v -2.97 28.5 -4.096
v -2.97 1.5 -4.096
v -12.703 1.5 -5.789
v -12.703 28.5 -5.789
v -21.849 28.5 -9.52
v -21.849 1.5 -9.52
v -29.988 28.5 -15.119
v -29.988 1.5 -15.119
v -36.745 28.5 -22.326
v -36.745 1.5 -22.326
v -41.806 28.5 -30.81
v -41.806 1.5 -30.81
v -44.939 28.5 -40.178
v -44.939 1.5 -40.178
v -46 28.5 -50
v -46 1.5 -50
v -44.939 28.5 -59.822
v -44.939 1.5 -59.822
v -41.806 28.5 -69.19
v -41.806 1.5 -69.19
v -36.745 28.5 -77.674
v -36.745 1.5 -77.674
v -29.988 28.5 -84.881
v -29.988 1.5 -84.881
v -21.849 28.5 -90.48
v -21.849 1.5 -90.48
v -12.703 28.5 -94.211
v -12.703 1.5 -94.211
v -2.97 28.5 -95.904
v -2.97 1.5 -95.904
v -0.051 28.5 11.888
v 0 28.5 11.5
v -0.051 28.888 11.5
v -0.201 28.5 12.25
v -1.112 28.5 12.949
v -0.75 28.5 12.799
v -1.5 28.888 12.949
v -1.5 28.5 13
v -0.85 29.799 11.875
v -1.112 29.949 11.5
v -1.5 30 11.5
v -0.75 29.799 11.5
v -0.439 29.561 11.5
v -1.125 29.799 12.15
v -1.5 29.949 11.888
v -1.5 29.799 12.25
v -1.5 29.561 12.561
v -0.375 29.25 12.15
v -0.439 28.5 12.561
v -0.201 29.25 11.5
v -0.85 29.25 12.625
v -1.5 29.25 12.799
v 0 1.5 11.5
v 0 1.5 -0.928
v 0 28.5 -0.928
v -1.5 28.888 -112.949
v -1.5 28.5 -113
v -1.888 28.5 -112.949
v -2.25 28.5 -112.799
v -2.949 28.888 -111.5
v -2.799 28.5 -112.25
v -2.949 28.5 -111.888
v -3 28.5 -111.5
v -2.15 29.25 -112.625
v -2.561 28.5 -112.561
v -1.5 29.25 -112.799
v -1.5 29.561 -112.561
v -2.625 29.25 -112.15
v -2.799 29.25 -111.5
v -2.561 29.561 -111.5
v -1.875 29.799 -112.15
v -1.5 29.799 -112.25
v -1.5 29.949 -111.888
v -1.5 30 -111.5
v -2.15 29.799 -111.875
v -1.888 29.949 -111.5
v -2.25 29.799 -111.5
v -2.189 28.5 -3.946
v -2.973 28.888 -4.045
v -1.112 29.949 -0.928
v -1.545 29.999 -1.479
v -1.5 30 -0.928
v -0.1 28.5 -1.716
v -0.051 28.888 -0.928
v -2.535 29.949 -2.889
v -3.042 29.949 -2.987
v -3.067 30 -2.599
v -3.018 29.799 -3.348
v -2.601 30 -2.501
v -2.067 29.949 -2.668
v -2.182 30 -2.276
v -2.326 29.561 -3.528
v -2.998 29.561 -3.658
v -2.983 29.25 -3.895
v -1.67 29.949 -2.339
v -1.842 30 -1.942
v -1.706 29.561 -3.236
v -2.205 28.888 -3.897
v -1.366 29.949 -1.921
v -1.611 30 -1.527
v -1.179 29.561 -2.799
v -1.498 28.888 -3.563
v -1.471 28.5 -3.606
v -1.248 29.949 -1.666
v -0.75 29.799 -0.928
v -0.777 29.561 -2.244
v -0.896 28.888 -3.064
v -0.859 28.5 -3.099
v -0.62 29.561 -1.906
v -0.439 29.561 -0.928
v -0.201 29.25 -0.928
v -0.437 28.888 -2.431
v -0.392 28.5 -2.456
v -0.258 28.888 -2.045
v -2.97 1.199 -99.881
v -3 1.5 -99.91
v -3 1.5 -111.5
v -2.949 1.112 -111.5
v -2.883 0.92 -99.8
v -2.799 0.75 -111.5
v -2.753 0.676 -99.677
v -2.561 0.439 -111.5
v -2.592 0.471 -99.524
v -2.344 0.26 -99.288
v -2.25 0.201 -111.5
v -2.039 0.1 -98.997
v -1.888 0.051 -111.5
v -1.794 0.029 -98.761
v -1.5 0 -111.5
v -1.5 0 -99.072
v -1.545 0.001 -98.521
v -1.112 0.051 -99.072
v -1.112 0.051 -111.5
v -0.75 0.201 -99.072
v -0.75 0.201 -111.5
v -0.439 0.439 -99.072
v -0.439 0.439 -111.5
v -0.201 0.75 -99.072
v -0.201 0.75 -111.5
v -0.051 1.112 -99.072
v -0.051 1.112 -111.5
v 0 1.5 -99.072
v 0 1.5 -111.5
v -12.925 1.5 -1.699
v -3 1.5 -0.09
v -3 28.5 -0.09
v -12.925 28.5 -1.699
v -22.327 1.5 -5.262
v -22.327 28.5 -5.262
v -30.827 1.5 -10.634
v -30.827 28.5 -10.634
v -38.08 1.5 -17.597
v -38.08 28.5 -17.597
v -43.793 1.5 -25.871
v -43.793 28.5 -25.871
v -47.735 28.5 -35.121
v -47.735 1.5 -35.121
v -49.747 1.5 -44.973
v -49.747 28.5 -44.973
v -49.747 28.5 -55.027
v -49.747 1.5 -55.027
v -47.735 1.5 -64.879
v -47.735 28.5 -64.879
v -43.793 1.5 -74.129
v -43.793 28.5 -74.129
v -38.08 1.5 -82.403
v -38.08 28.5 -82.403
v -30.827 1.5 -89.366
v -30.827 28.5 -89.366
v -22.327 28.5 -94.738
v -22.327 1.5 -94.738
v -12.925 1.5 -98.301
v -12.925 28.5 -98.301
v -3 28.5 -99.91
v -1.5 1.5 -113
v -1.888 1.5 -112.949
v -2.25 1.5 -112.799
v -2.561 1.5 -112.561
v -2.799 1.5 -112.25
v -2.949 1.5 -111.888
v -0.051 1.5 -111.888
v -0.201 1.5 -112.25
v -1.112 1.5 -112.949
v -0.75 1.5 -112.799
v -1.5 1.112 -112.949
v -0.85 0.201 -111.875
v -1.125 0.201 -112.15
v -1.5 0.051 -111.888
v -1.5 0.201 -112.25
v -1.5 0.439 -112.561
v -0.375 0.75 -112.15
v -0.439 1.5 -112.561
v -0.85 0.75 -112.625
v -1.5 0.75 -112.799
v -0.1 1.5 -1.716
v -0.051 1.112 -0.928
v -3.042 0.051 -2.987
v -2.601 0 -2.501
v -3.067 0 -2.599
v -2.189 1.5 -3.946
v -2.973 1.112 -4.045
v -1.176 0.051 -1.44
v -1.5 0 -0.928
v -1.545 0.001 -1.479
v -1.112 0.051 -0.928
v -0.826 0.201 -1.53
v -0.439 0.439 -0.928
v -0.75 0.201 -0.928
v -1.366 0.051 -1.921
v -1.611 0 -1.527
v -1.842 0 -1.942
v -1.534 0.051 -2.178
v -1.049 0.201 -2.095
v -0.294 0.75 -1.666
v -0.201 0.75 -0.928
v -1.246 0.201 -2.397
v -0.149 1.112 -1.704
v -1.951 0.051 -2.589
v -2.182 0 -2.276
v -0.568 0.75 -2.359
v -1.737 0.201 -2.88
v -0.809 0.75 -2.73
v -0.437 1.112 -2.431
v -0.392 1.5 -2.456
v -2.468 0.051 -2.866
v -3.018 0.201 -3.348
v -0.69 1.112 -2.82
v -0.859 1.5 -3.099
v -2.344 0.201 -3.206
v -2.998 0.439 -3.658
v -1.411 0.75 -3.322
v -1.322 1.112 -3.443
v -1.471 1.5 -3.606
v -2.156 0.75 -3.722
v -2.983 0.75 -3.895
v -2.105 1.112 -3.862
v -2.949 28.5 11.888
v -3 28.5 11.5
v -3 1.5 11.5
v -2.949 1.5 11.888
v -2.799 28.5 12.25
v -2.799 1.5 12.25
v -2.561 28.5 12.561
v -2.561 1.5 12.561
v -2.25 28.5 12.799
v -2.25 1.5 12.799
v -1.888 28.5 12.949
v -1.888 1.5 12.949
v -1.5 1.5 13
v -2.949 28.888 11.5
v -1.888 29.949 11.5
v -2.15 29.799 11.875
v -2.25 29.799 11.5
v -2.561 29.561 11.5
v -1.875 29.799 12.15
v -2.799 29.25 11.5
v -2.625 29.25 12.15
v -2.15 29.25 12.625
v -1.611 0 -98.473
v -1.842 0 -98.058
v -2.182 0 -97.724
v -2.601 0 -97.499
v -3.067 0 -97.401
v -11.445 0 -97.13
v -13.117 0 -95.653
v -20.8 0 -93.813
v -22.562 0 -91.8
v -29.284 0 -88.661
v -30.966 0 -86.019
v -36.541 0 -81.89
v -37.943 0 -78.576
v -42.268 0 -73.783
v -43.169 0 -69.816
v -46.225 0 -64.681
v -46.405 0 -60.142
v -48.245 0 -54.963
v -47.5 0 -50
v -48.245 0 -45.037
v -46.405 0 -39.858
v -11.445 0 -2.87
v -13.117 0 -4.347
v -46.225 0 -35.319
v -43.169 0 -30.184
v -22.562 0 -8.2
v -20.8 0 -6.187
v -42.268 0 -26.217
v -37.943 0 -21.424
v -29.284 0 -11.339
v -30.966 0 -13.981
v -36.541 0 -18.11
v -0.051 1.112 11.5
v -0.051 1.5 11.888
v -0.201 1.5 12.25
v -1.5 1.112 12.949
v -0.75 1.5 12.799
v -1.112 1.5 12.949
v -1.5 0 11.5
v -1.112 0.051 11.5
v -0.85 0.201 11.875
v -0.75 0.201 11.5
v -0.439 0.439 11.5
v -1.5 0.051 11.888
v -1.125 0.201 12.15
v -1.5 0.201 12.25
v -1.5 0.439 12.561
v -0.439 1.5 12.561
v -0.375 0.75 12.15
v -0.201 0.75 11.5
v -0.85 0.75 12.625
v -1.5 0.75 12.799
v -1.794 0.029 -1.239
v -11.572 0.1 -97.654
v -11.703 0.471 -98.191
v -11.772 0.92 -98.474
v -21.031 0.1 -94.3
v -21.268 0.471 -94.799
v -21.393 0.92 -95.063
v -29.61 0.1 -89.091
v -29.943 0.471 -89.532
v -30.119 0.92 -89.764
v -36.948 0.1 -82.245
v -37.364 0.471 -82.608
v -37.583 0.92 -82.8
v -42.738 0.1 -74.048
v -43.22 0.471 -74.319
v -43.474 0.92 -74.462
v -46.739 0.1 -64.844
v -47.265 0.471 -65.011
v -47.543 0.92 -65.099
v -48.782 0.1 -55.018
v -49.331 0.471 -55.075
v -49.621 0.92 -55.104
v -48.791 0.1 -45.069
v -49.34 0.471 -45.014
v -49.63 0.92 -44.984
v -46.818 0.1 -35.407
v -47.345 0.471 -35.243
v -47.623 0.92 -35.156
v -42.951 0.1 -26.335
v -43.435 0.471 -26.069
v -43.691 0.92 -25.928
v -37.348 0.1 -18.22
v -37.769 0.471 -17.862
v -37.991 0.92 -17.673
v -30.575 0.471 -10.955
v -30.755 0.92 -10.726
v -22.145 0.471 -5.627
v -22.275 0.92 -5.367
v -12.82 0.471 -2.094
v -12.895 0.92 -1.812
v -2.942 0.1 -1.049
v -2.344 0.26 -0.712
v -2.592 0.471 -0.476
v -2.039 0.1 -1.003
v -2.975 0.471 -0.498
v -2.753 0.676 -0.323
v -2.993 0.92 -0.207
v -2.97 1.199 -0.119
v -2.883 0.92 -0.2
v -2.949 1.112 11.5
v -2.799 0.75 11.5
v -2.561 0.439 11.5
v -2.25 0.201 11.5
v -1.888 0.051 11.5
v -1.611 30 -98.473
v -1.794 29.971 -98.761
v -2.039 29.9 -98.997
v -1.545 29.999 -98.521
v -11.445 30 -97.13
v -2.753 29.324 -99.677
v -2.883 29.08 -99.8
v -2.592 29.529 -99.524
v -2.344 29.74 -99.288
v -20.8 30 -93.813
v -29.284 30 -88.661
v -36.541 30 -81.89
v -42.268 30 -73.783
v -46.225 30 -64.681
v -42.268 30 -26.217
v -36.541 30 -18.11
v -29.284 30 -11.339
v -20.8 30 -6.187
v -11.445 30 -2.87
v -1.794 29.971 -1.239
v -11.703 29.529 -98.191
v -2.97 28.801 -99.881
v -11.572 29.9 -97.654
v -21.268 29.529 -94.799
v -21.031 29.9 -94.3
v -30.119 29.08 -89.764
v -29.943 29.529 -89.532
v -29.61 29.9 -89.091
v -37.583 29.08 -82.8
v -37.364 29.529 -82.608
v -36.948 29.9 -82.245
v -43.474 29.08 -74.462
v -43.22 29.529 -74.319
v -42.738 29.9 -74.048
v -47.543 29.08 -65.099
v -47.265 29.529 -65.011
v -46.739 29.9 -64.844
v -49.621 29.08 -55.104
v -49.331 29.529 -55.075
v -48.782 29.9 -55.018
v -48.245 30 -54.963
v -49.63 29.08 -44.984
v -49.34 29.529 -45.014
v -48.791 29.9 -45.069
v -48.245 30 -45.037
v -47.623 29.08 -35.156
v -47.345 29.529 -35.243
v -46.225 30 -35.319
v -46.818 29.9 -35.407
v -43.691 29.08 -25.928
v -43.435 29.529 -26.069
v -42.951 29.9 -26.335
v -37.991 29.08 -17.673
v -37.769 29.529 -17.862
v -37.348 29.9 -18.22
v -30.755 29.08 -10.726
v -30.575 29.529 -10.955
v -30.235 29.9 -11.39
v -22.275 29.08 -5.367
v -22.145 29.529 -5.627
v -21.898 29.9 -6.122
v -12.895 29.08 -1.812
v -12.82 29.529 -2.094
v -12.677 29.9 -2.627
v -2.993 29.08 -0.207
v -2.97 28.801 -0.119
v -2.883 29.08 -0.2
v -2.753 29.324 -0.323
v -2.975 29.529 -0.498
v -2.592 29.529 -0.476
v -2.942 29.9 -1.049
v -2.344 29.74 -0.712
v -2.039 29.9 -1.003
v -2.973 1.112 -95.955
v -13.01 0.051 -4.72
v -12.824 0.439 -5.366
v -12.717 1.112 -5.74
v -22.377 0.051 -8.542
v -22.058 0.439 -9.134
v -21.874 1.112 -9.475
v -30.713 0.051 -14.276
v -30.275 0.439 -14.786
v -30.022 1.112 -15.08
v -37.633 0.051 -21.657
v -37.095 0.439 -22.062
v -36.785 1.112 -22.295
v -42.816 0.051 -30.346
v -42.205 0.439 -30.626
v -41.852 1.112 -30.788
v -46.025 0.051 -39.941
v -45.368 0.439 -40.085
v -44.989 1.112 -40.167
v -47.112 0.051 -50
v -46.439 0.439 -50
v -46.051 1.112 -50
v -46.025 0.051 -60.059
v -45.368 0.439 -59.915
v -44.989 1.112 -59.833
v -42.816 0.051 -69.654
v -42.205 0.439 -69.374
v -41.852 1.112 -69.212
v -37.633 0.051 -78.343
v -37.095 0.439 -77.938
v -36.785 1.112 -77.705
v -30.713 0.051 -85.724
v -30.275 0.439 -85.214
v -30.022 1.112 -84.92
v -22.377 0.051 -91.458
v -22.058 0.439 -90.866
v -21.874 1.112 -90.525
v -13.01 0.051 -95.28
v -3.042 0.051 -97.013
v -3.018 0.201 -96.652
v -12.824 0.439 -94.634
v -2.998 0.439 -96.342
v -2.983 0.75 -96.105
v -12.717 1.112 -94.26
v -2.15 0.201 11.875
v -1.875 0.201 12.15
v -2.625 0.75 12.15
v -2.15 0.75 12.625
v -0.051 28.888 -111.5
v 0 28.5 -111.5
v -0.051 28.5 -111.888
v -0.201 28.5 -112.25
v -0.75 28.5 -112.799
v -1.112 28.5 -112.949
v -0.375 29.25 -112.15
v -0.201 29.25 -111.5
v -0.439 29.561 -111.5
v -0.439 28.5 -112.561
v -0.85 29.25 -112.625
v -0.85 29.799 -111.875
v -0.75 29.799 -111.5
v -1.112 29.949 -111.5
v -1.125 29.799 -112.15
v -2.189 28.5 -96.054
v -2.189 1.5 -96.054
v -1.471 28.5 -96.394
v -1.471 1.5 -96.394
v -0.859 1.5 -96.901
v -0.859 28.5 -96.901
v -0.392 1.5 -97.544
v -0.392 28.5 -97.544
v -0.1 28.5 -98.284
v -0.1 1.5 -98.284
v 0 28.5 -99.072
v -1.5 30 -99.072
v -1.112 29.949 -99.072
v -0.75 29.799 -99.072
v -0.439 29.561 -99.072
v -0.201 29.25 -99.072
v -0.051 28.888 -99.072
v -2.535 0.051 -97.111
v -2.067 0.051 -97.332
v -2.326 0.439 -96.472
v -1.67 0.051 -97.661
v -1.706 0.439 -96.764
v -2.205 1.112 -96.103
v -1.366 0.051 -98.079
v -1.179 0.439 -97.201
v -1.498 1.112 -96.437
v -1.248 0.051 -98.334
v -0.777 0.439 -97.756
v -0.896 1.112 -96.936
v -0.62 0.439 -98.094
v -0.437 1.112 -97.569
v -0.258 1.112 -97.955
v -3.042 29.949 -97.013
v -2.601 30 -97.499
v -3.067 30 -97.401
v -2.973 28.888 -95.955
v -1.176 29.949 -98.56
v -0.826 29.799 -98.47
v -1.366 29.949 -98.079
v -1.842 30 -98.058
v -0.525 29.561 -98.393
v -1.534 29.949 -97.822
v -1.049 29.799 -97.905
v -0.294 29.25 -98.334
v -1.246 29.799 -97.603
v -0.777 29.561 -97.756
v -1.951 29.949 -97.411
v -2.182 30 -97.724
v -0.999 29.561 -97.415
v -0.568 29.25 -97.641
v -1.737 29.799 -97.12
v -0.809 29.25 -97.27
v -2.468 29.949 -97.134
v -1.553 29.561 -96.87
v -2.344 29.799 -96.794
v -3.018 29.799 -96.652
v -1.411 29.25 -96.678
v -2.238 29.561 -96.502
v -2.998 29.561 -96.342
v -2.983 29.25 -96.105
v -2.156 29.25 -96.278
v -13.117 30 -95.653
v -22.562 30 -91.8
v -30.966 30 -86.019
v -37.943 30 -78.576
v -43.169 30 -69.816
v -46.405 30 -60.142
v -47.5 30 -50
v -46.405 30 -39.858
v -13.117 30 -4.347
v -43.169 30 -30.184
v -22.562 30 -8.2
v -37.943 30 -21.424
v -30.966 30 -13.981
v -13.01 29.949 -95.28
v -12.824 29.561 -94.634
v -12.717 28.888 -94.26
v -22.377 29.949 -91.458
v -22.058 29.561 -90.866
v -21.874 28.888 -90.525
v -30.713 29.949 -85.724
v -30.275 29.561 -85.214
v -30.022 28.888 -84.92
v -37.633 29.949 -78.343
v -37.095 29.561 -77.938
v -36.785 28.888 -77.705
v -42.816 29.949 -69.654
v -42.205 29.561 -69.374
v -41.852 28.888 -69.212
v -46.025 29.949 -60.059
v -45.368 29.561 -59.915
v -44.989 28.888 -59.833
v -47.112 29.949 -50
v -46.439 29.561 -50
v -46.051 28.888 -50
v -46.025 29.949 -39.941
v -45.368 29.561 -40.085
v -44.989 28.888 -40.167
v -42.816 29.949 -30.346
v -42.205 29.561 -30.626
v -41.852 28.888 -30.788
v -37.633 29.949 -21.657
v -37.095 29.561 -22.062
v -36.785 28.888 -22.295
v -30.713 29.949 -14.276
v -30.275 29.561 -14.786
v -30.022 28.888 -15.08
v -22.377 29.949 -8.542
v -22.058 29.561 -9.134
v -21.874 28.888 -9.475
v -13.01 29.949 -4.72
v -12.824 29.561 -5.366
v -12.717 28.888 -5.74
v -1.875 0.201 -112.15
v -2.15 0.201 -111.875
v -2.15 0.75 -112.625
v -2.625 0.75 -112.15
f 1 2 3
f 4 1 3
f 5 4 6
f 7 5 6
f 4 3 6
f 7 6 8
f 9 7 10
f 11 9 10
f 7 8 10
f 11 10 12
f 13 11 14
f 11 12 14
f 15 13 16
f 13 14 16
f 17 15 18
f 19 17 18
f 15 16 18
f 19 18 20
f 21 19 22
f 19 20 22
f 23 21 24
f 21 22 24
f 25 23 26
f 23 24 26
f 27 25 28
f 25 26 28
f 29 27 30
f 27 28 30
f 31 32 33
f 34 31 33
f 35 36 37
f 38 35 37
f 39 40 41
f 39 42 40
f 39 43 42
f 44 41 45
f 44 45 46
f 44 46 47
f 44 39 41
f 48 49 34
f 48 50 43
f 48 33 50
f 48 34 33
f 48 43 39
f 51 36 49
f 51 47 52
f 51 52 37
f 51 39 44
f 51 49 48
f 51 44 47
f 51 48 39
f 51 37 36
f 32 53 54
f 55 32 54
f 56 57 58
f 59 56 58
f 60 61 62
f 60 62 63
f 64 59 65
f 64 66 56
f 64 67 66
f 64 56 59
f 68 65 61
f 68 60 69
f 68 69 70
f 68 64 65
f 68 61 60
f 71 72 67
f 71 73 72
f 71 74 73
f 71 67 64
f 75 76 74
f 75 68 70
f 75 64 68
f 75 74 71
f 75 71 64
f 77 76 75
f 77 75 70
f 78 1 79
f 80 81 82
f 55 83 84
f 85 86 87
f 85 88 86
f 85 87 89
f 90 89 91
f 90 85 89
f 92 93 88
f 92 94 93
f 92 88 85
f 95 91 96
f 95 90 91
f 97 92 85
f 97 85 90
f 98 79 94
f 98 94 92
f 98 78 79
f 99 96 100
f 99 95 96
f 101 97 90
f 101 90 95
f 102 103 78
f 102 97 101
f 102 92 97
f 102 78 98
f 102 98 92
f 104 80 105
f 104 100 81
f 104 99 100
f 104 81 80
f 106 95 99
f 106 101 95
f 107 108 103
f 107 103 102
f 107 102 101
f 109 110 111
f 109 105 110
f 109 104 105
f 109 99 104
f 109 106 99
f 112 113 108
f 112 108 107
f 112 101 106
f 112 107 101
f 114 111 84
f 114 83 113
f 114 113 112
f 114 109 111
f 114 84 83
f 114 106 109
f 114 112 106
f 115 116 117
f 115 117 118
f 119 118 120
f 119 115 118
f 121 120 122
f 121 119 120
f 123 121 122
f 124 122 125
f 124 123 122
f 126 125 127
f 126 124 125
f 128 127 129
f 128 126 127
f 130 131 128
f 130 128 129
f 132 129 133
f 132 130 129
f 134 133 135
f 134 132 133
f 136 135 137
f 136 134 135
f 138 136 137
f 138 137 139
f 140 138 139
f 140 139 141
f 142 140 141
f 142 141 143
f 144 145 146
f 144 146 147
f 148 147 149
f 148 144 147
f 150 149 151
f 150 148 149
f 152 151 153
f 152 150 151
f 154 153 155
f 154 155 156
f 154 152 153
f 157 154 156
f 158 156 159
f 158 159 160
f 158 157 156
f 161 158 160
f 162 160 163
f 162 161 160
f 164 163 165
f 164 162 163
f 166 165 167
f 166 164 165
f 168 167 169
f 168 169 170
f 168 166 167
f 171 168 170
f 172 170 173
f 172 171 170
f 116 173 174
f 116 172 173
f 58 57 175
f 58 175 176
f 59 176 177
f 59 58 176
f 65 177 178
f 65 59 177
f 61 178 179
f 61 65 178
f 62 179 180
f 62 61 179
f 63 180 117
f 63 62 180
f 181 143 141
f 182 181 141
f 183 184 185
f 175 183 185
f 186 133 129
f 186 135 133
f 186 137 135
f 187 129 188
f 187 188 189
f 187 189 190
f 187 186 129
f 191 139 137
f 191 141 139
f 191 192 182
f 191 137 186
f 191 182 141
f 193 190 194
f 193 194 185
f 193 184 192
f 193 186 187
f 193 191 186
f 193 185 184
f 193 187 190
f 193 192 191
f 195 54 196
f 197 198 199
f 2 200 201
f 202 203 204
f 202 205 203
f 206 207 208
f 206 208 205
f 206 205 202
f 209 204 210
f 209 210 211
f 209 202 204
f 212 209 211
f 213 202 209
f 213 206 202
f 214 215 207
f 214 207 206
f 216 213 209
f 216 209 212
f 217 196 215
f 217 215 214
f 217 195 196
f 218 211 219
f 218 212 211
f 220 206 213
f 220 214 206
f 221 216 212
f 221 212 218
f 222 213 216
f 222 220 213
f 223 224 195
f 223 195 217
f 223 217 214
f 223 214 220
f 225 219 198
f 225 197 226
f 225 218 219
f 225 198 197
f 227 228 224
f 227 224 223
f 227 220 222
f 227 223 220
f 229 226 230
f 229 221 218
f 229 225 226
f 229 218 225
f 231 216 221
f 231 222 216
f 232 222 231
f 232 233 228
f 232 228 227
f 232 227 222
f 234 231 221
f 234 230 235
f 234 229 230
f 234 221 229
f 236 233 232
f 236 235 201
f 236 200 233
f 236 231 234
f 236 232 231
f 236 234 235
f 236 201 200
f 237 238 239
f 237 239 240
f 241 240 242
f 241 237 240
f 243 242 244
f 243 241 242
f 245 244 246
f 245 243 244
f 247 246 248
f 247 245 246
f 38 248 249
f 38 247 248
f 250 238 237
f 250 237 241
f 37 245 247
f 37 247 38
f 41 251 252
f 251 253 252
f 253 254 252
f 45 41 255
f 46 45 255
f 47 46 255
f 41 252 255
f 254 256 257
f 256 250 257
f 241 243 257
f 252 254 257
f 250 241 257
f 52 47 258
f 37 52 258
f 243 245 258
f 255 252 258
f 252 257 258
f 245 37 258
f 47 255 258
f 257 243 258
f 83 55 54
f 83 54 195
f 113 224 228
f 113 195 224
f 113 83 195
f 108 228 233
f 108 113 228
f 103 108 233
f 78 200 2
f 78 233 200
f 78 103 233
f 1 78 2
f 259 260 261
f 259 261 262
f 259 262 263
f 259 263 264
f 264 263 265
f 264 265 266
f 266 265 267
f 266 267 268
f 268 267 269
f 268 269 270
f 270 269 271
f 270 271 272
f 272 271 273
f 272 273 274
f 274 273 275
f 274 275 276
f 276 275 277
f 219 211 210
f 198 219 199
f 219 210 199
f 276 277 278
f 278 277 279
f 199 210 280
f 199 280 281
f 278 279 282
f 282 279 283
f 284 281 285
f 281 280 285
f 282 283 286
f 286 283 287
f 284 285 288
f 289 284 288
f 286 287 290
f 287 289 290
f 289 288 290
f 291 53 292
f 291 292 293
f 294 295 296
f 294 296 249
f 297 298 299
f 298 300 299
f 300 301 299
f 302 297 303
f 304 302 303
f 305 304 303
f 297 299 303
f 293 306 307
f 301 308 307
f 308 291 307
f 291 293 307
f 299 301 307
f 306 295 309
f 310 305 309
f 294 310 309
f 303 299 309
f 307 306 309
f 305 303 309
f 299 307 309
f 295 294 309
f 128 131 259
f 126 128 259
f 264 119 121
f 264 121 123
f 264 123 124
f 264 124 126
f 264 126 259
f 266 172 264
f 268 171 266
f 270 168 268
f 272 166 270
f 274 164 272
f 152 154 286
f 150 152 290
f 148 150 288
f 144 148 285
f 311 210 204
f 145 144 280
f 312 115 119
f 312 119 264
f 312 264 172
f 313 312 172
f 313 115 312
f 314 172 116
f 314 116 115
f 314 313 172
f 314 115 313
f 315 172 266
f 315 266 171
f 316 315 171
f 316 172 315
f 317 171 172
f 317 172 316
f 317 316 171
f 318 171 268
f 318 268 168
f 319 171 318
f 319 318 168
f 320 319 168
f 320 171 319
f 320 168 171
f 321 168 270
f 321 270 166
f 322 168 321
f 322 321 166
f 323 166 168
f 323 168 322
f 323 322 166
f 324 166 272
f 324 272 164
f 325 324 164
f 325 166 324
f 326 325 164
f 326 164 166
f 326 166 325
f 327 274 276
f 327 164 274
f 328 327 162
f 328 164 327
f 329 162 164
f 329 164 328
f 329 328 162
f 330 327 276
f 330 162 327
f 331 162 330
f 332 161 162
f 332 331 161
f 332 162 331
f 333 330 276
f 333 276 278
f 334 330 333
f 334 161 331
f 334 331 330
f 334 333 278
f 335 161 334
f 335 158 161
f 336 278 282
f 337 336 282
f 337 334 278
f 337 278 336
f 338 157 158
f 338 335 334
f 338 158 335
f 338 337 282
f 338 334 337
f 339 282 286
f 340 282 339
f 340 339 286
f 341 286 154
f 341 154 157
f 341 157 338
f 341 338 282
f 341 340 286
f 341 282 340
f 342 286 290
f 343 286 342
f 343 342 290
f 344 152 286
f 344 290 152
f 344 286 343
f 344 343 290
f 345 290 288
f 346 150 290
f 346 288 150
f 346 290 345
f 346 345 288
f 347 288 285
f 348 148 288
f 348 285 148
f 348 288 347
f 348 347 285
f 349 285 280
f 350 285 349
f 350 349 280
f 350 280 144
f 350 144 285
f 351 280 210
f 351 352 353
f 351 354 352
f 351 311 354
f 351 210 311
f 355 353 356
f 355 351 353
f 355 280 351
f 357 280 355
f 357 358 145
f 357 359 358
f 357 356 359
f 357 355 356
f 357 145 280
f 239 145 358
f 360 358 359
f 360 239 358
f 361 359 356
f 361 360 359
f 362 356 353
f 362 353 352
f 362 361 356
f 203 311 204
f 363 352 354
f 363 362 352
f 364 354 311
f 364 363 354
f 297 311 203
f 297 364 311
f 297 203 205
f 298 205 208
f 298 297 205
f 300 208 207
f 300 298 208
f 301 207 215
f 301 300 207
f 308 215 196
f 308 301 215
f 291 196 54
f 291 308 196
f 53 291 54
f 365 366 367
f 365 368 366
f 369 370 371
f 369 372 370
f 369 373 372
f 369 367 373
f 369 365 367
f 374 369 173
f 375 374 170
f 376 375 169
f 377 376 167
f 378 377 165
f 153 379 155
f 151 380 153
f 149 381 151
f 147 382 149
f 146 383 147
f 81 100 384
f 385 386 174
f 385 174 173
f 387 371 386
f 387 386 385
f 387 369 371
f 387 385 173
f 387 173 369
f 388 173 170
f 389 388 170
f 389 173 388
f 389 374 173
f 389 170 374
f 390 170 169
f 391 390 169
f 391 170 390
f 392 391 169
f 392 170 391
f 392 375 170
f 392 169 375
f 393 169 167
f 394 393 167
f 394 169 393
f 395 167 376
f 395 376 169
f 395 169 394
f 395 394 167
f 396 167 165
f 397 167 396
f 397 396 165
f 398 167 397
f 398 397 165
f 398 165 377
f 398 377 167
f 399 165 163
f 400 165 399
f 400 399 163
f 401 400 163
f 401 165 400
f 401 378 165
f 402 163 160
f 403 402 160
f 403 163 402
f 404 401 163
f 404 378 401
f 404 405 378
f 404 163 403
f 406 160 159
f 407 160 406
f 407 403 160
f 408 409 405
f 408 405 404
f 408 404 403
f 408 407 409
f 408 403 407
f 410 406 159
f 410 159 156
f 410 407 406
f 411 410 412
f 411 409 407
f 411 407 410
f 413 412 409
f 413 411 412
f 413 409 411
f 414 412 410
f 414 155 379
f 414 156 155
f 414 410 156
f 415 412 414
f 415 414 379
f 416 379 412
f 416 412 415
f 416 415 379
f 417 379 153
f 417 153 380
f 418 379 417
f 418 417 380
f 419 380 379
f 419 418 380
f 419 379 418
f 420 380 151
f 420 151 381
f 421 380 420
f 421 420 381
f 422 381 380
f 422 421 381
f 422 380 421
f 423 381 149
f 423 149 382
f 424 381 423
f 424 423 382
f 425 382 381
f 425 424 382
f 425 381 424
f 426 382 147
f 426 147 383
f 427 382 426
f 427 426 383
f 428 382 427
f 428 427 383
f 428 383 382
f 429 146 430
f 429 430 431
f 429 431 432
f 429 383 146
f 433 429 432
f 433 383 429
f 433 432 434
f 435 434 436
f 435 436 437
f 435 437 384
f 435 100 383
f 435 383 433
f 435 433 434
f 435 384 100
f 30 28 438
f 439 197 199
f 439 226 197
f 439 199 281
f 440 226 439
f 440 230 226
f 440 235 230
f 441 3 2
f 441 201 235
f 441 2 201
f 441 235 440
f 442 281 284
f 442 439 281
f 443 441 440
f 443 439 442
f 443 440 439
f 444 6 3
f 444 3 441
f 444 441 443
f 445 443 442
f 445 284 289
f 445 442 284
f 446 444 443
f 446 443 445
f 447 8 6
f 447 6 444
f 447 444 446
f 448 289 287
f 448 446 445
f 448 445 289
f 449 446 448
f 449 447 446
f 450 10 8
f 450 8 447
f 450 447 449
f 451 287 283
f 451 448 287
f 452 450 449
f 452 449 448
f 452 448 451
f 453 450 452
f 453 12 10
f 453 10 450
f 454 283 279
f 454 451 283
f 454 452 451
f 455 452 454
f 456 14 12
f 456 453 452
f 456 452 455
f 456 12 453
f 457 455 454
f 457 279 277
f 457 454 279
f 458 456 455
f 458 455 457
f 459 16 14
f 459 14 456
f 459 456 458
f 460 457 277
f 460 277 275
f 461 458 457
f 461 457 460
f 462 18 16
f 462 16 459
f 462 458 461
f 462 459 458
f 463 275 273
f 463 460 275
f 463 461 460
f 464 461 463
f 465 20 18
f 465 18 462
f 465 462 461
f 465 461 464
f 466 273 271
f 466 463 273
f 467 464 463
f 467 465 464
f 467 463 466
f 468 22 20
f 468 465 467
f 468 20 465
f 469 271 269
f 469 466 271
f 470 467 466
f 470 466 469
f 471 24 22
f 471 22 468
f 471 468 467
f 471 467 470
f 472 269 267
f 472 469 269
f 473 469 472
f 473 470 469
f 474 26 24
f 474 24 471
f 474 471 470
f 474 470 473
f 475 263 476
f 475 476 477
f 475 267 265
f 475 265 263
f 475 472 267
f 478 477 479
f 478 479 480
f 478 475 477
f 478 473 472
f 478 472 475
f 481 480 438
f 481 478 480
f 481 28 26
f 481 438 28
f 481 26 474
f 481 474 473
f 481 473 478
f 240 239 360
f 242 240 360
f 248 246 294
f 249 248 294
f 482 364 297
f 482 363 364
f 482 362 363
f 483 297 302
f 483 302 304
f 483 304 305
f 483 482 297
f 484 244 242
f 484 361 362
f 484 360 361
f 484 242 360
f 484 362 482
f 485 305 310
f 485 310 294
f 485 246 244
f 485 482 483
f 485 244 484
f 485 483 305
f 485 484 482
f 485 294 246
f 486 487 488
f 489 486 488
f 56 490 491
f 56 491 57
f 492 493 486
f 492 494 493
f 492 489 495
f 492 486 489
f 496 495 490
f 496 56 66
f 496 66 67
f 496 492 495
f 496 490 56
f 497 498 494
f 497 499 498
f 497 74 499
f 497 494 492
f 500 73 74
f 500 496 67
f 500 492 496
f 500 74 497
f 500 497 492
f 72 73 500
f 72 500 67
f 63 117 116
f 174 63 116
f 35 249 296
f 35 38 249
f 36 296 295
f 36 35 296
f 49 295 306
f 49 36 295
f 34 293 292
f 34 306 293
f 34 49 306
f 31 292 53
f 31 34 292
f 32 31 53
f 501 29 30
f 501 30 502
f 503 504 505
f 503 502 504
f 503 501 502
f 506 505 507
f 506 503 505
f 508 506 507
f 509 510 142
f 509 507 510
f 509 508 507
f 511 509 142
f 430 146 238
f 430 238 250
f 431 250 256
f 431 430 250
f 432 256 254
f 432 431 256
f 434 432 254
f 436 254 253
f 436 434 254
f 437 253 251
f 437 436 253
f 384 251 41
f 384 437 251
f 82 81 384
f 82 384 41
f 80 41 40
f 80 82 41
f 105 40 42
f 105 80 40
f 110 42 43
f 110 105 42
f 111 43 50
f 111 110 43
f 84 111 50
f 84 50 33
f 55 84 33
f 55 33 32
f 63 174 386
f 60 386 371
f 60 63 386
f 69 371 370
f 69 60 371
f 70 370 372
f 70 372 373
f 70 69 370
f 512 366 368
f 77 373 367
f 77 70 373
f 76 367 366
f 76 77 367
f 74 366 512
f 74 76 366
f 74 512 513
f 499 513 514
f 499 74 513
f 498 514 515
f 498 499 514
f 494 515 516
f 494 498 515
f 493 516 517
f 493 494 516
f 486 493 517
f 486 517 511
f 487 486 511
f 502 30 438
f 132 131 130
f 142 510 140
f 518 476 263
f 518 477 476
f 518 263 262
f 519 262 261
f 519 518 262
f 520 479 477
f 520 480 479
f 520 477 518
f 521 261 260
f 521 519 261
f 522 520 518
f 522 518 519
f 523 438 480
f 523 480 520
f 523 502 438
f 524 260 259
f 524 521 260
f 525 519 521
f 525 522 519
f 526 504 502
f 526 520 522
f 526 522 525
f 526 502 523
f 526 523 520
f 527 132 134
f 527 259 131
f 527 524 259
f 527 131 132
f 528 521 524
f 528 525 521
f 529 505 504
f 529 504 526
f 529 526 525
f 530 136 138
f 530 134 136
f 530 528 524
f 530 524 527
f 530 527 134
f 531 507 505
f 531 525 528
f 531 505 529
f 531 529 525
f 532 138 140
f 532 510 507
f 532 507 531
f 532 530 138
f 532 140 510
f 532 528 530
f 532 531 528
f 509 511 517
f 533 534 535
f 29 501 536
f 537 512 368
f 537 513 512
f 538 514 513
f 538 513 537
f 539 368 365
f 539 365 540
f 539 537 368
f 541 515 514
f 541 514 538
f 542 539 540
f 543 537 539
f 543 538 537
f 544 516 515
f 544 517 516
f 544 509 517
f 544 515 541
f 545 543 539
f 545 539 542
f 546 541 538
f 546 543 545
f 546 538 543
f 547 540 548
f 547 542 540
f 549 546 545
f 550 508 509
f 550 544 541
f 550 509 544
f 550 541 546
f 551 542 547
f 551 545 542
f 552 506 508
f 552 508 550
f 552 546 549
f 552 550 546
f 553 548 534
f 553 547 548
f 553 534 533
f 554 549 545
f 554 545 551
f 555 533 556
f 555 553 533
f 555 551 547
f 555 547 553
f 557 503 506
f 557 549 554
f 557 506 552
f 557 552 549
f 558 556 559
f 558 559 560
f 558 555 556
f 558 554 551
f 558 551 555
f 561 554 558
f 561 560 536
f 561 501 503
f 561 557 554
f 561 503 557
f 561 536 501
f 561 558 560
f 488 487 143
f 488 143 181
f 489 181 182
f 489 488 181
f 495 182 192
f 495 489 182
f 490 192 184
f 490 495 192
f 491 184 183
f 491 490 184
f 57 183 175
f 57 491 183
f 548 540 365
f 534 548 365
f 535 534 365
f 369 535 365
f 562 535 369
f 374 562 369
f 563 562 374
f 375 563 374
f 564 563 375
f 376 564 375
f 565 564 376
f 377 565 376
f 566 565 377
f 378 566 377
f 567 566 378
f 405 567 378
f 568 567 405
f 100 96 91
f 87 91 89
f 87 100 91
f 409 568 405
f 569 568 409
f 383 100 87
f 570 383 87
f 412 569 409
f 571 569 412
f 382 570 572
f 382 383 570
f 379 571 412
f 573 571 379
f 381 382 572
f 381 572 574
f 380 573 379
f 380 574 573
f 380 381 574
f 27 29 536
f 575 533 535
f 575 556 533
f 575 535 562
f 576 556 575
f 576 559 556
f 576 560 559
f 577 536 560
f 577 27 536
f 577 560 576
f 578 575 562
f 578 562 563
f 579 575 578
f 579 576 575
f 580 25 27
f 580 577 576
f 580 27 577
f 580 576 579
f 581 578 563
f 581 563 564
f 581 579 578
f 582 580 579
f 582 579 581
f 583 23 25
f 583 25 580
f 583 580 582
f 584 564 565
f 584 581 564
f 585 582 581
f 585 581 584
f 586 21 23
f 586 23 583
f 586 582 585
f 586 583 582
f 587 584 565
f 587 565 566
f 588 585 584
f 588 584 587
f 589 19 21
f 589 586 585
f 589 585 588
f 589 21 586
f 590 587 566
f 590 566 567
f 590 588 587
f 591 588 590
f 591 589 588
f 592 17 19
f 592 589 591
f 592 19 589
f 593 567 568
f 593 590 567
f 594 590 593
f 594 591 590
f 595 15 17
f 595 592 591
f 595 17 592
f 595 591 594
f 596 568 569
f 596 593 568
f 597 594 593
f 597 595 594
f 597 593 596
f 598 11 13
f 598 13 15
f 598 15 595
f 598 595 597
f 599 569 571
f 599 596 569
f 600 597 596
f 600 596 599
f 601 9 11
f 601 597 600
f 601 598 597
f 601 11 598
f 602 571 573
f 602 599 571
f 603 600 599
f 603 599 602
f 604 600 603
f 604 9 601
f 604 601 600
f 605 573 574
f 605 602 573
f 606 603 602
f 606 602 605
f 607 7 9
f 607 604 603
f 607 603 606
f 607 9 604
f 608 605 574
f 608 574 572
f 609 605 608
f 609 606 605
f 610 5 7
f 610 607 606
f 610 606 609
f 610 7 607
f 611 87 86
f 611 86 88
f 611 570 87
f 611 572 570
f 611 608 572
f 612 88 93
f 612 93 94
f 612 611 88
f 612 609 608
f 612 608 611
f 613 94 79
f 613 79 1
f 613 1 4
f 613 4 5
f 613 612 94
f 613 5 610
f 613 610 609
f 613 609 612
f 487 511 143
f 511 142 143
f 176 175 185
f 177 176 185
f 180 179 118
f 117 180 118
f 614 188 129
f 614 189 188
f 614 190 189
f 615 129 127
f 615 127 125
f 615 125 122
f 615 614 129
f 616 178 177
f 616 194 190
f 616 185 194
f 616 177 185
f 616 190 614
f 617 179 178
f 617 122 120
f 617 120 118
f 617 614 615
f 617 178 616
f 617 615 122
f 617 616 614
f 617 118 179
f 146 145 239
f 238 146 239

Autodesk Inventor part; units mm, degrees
ref_plane "YZ Plane" through (0, 0, 0) normal (1, 0, 0) x (0, 1, 0)
ref_plane "XZ Plane" through (0, 0, 0) normal (0, 1, 0) x (-1, 0, 0)
ref_plane "XY Plane" through (0, 0, 0) normal (0, 0, 1) x (1, 0, 0)
sketch "Sketch1" plane through (0, 0, 0) normal (0, 1, 0) x (-1, 0, 0)
  line L0 (0, 0) -> (0, -100)
  line L1 (0, -50) -> (50, -50)
  circle A0 centre (0, -50) radius 50
  line L2 (50, -50) -> (46, -50)
  line L3 (0, 0) -> (0, 13)
  line L4 (0, -100) -> (0, -113)
  circle A1 centre (0, -50) radius 46
  line L5 (0, 13) -> (3, 13)
  line L6 (3, 13) -> (3, -0.99065)
  line L7 (3, -0.99065) -> (0, -0.99065)
  line L8 (0, -0.99065) -> (0, 13)
  line L9 (0, -113) -> (3, -113)
  line L10 (3, -113) -> (3, -98.99687)
  line L11 (3, -98.99687) -> (0, -98.99687)
  line L12 (0, -98.99687) -> (0, -113)
  point P0 (0, -4)
  point P1 (0, -96)
  point P2 (3, -99.909919)
  point P3 (3, -0.090081)
  dimension "d0" = 100
  dimension "d1" = 50
  dimension "d2" = 4
  dimension "d3" = 13
  dimension "d4" = 13
  dimension "d5" = 3
  dimension "d6" = 3
sketch "Sketch1 outline for Extrusion1" plane through (0, 0, 0) normal (0, 1, 0) x (-1, 0, 0)
  line L0 (3, 13) -> (0, 13)
  line L1 (3, -0.090081) -> (3, 13)
  arc A0 (3, -99.909919) -> (3, -0.090081) centre (0, -50) ccw
  line L2 (3, -113) -> (3, -99.909919)
  line L3 (0, -113) -> (3, -113)
  line L4 (0, -100) -> (0, -113)
  line L5 (0, -96) -> (0, -100)
  arc A1 (0, -4) -> (0, -96) centre (0, -50) cw
  line L6 (0, 0) -> (0, -4)
  line L7 (0, 13) -> (0, 0)
extrude "Extrusion1" add sketch "Sketch1 outline for Extrusion1" along normal blind 30
fillet "Fillet1" radius 3.175 2 edges at (0, 15, -96) (0, 15, -4)
fillet "Fillet2" radius 1.5 4 edges at (-3, 15, 13) (0, 15, 13) (-3, 15, -113) (0, 15, -113)
fillet "Fillet3" radius 1.5 20 edges at (-0.8586, 30, -96.901) (-0.8586, 30, -3.099) (0, 30, -99.5362) (0, 30, -0.4638) (-2.5607, 30, -112.5607) (-3, 30, -105.705) (-2.5607, 30, 12.5607) (-3, 30, 5.705) (-46, 30, -50) (-50, 30, -50) (-0.8586, 0, -96.901) (-0.8586, 0, -3.099) (0, 0, -99.5362) (0, 0, -0.4638) (-2.5607, 0, -112.5607) (-3, 0, -105.705) (-2.5607, 0, 12.5607) (-3, 0, 5.705) (-46, 0, -50) (-50, 0, -50)
properties part number "handle"
